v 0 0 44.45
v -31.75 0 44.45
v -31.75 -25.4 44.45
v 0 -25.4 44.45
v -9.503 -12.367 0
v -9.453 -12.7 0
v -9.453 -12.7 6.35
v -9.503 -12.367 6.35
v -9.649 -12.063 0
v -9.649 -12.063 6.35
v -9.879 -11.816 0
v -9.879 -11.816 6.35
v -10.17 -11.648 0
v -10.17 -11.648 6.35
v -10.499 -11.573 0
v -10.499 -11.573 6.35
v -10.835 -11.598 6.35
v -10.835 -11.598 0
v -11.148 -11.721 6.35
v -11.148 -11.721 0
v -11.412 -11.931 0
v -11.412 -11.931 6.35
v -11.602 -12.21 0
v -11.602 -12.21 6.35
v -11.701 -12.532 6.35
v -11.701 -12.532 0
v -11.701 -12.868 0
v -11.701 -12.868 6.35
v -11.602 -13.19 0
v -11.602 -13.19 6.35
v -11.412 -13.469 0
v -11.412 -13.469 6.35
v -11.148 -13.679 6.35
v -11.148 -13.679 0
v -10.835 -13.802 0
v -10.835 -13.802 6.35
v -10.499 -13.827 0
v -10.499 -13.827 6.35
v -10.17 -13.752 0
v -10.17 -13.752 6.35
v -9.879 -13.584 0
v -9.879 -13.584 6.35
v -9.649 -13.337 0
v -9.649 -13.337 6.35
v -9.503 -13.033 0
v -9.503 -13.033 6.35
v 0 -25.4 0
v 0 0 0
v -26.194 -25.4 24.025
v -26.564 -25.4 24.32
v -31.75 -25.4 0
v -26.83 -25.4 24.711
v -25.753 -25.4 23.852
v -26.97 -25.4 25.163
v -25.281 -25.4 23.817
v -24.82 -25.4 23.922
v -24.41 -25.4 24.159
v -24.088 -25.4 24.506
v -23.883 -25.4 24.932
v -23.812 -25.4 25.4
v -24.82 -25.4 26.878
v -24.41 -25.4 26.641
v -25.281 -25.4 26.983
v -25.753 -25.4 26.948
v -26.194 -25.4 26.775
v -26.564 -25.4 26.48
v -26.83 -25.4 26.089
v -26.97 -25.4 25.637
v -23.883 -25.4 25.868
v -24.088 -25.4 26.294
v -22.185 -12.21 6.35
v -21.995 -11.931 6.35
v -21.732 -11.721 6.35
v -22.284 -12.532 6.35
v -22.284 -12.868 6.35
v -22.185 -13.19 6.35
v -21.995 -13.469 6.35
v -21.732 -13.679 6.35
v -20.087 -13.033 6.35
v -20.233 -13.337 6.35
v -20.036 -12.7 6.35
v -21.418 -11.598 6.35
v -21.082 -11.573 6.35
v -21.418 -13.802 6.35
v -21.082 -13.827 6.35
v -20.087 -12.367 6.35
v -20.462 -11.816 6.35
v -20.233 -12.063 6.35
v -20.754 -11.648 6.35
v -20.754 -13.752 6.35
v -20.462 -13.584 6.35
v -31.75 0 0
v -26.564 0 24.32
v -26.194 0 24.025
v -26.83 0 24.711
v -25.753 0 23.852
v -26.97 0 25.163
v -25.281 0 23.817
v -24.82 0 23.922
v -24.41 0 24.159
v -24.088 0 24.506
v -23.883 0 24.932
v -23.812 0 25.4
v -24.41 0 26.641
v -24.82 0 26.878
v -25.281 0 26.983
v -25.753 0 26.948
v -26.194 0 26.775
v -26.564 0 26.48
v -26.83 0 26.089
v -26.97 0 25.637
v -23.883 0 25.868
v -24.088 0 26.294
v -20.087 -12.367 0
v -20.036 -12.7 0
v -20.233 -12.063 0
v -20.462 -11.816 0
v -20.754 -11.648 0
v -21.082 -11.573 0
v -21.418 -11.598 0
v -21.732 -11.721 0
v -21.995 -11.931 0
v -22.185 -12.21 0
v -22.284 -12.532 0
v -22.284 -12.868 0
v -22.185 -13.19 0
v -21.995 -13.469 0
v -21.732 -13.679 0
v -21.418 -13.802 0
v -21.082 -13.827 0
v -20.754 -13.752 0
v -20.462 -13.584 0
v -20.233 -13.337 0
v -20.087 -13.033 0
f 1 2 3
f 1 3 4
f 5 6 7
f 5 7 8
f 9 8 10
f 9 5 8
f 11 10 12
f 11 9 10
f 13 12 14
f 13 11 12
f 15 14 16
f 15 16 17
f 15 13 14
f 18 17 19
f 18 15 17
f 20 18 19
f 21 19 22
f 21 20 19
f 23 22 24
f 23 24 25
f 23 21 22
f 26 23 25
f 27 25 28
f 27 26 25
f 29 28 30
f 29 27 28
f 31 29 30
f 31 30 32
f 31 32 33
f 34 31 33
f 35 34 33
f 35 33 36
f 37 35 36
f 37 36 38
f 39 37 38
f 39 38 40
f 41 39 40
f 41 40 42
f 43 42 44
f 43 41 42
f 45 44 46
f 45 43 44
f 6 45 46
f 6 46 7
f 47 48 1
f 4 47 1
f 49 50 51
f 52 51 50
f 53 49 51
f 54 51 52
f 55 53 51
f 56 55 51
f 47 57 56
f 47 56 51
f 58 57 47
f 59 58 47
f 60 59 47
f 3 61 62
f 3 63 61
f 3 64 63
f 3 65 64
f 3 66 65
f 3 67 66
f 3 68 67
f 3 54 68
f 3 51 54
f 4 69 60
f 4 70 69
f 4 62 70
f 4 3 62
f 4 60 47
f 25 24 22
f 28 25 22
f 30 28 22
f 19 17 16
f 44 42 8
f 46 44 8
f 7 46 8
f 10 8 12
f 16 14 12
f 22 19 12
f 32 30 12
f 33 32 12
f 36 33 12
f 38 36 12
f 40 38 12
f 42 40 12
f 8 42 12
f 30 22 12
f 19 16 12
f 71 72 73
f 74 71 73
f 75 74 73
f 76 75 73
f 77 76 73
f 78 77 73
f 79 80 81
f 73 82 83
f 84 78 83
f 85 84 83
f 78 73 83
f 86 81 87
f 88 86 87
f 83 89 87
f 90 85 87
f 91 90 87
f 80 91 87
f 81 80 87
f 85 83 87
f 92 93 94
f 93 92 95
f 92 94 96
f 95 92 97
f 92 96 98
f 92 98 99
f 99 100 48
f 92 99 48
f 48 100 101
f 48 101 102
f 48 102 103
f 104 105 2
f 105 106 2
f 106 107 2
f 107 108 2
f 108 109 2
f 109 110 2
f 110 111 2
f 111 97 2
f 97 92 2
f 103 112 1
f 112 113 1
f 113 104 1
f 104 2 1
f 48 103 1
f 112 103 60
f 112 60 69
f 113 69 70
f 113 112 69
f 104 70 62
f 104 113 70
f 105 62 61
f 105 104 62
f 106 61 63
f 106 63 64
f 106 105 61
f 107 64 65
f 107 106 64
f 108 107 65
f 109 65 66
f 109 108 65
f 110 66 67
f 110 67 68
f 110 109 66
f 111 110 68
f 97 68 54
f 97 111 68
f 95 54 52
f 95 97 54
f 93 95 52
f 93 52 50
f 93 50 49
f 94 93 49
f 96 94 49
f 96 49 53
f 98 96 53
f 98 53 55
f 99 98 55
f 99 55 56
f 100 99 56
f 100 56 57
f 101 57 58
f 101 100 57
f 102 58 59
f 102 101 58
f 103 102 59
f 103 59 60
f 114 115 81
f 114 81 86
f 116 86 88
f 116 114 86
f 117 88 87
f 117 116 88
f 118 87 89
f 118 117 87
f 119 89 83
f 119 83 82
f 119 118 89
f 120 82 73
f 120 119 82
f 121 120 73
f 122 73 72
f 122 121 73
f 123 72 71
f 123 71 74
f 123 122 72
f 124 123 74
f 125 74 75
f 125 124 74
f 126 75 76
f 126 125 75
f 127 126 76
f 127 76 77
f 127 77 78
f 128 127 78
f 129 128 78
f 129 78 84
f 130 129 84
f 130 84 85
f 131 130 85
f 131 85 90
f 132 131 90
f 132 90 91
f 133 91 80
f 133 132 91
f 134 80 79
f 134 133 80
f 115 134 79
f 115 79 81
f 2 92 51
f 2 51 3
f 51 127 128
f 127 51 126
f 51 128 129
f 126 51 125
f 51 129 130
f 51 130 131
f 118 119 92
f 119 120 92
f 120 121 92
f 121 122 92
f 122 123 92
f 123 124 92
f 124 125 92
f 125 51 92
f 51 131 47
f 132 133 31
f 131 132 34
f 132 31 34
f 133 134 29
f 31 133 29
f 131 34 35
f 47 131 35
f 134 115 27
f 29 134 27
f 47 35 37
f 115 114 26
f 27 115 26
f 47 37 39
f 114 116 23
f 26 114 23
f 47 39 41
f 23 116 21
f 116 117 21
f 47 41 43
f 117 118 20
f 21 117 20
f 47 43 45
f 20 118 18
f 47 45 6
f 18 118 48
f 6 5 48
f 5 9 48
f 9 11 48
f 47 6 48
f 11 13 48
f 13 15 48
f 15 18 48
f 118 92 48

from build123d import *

# Parameters (mm, degrees)
F0_W     = 31.75
F0_H     = 44.45
F0_R     = 1.5875
F1_DEPTH = 25.4
F2_R     = 1.1303
F3_DEPTH = 6.35


with BuildPart() as f1:
    # F0 (on Front) → F1 (new body)
    with BuildSketch(Plane.XZ):
        with Locations((-15.875, 22.225)):
            Rectangle(F0_W, F0_H)
        with Locations((-25.4, 25.4)):
            Circle(F0_R, mode=Mode.SUBTRACT)
    extrude(amount=F1_DEPTH)

    # F2 (on Top) → F3 (cut)
    with BuildSketch(Plane.XY):
        with Locations((-21.166667, -12.7)):
            Circle(F2_R)
        with Locations((-10.583333, -12.7)):
            Circle(F2_R)
    extrude(amount=F3_DEPTH, mode=Mode.SUBTRACT)


solid = f1.part
